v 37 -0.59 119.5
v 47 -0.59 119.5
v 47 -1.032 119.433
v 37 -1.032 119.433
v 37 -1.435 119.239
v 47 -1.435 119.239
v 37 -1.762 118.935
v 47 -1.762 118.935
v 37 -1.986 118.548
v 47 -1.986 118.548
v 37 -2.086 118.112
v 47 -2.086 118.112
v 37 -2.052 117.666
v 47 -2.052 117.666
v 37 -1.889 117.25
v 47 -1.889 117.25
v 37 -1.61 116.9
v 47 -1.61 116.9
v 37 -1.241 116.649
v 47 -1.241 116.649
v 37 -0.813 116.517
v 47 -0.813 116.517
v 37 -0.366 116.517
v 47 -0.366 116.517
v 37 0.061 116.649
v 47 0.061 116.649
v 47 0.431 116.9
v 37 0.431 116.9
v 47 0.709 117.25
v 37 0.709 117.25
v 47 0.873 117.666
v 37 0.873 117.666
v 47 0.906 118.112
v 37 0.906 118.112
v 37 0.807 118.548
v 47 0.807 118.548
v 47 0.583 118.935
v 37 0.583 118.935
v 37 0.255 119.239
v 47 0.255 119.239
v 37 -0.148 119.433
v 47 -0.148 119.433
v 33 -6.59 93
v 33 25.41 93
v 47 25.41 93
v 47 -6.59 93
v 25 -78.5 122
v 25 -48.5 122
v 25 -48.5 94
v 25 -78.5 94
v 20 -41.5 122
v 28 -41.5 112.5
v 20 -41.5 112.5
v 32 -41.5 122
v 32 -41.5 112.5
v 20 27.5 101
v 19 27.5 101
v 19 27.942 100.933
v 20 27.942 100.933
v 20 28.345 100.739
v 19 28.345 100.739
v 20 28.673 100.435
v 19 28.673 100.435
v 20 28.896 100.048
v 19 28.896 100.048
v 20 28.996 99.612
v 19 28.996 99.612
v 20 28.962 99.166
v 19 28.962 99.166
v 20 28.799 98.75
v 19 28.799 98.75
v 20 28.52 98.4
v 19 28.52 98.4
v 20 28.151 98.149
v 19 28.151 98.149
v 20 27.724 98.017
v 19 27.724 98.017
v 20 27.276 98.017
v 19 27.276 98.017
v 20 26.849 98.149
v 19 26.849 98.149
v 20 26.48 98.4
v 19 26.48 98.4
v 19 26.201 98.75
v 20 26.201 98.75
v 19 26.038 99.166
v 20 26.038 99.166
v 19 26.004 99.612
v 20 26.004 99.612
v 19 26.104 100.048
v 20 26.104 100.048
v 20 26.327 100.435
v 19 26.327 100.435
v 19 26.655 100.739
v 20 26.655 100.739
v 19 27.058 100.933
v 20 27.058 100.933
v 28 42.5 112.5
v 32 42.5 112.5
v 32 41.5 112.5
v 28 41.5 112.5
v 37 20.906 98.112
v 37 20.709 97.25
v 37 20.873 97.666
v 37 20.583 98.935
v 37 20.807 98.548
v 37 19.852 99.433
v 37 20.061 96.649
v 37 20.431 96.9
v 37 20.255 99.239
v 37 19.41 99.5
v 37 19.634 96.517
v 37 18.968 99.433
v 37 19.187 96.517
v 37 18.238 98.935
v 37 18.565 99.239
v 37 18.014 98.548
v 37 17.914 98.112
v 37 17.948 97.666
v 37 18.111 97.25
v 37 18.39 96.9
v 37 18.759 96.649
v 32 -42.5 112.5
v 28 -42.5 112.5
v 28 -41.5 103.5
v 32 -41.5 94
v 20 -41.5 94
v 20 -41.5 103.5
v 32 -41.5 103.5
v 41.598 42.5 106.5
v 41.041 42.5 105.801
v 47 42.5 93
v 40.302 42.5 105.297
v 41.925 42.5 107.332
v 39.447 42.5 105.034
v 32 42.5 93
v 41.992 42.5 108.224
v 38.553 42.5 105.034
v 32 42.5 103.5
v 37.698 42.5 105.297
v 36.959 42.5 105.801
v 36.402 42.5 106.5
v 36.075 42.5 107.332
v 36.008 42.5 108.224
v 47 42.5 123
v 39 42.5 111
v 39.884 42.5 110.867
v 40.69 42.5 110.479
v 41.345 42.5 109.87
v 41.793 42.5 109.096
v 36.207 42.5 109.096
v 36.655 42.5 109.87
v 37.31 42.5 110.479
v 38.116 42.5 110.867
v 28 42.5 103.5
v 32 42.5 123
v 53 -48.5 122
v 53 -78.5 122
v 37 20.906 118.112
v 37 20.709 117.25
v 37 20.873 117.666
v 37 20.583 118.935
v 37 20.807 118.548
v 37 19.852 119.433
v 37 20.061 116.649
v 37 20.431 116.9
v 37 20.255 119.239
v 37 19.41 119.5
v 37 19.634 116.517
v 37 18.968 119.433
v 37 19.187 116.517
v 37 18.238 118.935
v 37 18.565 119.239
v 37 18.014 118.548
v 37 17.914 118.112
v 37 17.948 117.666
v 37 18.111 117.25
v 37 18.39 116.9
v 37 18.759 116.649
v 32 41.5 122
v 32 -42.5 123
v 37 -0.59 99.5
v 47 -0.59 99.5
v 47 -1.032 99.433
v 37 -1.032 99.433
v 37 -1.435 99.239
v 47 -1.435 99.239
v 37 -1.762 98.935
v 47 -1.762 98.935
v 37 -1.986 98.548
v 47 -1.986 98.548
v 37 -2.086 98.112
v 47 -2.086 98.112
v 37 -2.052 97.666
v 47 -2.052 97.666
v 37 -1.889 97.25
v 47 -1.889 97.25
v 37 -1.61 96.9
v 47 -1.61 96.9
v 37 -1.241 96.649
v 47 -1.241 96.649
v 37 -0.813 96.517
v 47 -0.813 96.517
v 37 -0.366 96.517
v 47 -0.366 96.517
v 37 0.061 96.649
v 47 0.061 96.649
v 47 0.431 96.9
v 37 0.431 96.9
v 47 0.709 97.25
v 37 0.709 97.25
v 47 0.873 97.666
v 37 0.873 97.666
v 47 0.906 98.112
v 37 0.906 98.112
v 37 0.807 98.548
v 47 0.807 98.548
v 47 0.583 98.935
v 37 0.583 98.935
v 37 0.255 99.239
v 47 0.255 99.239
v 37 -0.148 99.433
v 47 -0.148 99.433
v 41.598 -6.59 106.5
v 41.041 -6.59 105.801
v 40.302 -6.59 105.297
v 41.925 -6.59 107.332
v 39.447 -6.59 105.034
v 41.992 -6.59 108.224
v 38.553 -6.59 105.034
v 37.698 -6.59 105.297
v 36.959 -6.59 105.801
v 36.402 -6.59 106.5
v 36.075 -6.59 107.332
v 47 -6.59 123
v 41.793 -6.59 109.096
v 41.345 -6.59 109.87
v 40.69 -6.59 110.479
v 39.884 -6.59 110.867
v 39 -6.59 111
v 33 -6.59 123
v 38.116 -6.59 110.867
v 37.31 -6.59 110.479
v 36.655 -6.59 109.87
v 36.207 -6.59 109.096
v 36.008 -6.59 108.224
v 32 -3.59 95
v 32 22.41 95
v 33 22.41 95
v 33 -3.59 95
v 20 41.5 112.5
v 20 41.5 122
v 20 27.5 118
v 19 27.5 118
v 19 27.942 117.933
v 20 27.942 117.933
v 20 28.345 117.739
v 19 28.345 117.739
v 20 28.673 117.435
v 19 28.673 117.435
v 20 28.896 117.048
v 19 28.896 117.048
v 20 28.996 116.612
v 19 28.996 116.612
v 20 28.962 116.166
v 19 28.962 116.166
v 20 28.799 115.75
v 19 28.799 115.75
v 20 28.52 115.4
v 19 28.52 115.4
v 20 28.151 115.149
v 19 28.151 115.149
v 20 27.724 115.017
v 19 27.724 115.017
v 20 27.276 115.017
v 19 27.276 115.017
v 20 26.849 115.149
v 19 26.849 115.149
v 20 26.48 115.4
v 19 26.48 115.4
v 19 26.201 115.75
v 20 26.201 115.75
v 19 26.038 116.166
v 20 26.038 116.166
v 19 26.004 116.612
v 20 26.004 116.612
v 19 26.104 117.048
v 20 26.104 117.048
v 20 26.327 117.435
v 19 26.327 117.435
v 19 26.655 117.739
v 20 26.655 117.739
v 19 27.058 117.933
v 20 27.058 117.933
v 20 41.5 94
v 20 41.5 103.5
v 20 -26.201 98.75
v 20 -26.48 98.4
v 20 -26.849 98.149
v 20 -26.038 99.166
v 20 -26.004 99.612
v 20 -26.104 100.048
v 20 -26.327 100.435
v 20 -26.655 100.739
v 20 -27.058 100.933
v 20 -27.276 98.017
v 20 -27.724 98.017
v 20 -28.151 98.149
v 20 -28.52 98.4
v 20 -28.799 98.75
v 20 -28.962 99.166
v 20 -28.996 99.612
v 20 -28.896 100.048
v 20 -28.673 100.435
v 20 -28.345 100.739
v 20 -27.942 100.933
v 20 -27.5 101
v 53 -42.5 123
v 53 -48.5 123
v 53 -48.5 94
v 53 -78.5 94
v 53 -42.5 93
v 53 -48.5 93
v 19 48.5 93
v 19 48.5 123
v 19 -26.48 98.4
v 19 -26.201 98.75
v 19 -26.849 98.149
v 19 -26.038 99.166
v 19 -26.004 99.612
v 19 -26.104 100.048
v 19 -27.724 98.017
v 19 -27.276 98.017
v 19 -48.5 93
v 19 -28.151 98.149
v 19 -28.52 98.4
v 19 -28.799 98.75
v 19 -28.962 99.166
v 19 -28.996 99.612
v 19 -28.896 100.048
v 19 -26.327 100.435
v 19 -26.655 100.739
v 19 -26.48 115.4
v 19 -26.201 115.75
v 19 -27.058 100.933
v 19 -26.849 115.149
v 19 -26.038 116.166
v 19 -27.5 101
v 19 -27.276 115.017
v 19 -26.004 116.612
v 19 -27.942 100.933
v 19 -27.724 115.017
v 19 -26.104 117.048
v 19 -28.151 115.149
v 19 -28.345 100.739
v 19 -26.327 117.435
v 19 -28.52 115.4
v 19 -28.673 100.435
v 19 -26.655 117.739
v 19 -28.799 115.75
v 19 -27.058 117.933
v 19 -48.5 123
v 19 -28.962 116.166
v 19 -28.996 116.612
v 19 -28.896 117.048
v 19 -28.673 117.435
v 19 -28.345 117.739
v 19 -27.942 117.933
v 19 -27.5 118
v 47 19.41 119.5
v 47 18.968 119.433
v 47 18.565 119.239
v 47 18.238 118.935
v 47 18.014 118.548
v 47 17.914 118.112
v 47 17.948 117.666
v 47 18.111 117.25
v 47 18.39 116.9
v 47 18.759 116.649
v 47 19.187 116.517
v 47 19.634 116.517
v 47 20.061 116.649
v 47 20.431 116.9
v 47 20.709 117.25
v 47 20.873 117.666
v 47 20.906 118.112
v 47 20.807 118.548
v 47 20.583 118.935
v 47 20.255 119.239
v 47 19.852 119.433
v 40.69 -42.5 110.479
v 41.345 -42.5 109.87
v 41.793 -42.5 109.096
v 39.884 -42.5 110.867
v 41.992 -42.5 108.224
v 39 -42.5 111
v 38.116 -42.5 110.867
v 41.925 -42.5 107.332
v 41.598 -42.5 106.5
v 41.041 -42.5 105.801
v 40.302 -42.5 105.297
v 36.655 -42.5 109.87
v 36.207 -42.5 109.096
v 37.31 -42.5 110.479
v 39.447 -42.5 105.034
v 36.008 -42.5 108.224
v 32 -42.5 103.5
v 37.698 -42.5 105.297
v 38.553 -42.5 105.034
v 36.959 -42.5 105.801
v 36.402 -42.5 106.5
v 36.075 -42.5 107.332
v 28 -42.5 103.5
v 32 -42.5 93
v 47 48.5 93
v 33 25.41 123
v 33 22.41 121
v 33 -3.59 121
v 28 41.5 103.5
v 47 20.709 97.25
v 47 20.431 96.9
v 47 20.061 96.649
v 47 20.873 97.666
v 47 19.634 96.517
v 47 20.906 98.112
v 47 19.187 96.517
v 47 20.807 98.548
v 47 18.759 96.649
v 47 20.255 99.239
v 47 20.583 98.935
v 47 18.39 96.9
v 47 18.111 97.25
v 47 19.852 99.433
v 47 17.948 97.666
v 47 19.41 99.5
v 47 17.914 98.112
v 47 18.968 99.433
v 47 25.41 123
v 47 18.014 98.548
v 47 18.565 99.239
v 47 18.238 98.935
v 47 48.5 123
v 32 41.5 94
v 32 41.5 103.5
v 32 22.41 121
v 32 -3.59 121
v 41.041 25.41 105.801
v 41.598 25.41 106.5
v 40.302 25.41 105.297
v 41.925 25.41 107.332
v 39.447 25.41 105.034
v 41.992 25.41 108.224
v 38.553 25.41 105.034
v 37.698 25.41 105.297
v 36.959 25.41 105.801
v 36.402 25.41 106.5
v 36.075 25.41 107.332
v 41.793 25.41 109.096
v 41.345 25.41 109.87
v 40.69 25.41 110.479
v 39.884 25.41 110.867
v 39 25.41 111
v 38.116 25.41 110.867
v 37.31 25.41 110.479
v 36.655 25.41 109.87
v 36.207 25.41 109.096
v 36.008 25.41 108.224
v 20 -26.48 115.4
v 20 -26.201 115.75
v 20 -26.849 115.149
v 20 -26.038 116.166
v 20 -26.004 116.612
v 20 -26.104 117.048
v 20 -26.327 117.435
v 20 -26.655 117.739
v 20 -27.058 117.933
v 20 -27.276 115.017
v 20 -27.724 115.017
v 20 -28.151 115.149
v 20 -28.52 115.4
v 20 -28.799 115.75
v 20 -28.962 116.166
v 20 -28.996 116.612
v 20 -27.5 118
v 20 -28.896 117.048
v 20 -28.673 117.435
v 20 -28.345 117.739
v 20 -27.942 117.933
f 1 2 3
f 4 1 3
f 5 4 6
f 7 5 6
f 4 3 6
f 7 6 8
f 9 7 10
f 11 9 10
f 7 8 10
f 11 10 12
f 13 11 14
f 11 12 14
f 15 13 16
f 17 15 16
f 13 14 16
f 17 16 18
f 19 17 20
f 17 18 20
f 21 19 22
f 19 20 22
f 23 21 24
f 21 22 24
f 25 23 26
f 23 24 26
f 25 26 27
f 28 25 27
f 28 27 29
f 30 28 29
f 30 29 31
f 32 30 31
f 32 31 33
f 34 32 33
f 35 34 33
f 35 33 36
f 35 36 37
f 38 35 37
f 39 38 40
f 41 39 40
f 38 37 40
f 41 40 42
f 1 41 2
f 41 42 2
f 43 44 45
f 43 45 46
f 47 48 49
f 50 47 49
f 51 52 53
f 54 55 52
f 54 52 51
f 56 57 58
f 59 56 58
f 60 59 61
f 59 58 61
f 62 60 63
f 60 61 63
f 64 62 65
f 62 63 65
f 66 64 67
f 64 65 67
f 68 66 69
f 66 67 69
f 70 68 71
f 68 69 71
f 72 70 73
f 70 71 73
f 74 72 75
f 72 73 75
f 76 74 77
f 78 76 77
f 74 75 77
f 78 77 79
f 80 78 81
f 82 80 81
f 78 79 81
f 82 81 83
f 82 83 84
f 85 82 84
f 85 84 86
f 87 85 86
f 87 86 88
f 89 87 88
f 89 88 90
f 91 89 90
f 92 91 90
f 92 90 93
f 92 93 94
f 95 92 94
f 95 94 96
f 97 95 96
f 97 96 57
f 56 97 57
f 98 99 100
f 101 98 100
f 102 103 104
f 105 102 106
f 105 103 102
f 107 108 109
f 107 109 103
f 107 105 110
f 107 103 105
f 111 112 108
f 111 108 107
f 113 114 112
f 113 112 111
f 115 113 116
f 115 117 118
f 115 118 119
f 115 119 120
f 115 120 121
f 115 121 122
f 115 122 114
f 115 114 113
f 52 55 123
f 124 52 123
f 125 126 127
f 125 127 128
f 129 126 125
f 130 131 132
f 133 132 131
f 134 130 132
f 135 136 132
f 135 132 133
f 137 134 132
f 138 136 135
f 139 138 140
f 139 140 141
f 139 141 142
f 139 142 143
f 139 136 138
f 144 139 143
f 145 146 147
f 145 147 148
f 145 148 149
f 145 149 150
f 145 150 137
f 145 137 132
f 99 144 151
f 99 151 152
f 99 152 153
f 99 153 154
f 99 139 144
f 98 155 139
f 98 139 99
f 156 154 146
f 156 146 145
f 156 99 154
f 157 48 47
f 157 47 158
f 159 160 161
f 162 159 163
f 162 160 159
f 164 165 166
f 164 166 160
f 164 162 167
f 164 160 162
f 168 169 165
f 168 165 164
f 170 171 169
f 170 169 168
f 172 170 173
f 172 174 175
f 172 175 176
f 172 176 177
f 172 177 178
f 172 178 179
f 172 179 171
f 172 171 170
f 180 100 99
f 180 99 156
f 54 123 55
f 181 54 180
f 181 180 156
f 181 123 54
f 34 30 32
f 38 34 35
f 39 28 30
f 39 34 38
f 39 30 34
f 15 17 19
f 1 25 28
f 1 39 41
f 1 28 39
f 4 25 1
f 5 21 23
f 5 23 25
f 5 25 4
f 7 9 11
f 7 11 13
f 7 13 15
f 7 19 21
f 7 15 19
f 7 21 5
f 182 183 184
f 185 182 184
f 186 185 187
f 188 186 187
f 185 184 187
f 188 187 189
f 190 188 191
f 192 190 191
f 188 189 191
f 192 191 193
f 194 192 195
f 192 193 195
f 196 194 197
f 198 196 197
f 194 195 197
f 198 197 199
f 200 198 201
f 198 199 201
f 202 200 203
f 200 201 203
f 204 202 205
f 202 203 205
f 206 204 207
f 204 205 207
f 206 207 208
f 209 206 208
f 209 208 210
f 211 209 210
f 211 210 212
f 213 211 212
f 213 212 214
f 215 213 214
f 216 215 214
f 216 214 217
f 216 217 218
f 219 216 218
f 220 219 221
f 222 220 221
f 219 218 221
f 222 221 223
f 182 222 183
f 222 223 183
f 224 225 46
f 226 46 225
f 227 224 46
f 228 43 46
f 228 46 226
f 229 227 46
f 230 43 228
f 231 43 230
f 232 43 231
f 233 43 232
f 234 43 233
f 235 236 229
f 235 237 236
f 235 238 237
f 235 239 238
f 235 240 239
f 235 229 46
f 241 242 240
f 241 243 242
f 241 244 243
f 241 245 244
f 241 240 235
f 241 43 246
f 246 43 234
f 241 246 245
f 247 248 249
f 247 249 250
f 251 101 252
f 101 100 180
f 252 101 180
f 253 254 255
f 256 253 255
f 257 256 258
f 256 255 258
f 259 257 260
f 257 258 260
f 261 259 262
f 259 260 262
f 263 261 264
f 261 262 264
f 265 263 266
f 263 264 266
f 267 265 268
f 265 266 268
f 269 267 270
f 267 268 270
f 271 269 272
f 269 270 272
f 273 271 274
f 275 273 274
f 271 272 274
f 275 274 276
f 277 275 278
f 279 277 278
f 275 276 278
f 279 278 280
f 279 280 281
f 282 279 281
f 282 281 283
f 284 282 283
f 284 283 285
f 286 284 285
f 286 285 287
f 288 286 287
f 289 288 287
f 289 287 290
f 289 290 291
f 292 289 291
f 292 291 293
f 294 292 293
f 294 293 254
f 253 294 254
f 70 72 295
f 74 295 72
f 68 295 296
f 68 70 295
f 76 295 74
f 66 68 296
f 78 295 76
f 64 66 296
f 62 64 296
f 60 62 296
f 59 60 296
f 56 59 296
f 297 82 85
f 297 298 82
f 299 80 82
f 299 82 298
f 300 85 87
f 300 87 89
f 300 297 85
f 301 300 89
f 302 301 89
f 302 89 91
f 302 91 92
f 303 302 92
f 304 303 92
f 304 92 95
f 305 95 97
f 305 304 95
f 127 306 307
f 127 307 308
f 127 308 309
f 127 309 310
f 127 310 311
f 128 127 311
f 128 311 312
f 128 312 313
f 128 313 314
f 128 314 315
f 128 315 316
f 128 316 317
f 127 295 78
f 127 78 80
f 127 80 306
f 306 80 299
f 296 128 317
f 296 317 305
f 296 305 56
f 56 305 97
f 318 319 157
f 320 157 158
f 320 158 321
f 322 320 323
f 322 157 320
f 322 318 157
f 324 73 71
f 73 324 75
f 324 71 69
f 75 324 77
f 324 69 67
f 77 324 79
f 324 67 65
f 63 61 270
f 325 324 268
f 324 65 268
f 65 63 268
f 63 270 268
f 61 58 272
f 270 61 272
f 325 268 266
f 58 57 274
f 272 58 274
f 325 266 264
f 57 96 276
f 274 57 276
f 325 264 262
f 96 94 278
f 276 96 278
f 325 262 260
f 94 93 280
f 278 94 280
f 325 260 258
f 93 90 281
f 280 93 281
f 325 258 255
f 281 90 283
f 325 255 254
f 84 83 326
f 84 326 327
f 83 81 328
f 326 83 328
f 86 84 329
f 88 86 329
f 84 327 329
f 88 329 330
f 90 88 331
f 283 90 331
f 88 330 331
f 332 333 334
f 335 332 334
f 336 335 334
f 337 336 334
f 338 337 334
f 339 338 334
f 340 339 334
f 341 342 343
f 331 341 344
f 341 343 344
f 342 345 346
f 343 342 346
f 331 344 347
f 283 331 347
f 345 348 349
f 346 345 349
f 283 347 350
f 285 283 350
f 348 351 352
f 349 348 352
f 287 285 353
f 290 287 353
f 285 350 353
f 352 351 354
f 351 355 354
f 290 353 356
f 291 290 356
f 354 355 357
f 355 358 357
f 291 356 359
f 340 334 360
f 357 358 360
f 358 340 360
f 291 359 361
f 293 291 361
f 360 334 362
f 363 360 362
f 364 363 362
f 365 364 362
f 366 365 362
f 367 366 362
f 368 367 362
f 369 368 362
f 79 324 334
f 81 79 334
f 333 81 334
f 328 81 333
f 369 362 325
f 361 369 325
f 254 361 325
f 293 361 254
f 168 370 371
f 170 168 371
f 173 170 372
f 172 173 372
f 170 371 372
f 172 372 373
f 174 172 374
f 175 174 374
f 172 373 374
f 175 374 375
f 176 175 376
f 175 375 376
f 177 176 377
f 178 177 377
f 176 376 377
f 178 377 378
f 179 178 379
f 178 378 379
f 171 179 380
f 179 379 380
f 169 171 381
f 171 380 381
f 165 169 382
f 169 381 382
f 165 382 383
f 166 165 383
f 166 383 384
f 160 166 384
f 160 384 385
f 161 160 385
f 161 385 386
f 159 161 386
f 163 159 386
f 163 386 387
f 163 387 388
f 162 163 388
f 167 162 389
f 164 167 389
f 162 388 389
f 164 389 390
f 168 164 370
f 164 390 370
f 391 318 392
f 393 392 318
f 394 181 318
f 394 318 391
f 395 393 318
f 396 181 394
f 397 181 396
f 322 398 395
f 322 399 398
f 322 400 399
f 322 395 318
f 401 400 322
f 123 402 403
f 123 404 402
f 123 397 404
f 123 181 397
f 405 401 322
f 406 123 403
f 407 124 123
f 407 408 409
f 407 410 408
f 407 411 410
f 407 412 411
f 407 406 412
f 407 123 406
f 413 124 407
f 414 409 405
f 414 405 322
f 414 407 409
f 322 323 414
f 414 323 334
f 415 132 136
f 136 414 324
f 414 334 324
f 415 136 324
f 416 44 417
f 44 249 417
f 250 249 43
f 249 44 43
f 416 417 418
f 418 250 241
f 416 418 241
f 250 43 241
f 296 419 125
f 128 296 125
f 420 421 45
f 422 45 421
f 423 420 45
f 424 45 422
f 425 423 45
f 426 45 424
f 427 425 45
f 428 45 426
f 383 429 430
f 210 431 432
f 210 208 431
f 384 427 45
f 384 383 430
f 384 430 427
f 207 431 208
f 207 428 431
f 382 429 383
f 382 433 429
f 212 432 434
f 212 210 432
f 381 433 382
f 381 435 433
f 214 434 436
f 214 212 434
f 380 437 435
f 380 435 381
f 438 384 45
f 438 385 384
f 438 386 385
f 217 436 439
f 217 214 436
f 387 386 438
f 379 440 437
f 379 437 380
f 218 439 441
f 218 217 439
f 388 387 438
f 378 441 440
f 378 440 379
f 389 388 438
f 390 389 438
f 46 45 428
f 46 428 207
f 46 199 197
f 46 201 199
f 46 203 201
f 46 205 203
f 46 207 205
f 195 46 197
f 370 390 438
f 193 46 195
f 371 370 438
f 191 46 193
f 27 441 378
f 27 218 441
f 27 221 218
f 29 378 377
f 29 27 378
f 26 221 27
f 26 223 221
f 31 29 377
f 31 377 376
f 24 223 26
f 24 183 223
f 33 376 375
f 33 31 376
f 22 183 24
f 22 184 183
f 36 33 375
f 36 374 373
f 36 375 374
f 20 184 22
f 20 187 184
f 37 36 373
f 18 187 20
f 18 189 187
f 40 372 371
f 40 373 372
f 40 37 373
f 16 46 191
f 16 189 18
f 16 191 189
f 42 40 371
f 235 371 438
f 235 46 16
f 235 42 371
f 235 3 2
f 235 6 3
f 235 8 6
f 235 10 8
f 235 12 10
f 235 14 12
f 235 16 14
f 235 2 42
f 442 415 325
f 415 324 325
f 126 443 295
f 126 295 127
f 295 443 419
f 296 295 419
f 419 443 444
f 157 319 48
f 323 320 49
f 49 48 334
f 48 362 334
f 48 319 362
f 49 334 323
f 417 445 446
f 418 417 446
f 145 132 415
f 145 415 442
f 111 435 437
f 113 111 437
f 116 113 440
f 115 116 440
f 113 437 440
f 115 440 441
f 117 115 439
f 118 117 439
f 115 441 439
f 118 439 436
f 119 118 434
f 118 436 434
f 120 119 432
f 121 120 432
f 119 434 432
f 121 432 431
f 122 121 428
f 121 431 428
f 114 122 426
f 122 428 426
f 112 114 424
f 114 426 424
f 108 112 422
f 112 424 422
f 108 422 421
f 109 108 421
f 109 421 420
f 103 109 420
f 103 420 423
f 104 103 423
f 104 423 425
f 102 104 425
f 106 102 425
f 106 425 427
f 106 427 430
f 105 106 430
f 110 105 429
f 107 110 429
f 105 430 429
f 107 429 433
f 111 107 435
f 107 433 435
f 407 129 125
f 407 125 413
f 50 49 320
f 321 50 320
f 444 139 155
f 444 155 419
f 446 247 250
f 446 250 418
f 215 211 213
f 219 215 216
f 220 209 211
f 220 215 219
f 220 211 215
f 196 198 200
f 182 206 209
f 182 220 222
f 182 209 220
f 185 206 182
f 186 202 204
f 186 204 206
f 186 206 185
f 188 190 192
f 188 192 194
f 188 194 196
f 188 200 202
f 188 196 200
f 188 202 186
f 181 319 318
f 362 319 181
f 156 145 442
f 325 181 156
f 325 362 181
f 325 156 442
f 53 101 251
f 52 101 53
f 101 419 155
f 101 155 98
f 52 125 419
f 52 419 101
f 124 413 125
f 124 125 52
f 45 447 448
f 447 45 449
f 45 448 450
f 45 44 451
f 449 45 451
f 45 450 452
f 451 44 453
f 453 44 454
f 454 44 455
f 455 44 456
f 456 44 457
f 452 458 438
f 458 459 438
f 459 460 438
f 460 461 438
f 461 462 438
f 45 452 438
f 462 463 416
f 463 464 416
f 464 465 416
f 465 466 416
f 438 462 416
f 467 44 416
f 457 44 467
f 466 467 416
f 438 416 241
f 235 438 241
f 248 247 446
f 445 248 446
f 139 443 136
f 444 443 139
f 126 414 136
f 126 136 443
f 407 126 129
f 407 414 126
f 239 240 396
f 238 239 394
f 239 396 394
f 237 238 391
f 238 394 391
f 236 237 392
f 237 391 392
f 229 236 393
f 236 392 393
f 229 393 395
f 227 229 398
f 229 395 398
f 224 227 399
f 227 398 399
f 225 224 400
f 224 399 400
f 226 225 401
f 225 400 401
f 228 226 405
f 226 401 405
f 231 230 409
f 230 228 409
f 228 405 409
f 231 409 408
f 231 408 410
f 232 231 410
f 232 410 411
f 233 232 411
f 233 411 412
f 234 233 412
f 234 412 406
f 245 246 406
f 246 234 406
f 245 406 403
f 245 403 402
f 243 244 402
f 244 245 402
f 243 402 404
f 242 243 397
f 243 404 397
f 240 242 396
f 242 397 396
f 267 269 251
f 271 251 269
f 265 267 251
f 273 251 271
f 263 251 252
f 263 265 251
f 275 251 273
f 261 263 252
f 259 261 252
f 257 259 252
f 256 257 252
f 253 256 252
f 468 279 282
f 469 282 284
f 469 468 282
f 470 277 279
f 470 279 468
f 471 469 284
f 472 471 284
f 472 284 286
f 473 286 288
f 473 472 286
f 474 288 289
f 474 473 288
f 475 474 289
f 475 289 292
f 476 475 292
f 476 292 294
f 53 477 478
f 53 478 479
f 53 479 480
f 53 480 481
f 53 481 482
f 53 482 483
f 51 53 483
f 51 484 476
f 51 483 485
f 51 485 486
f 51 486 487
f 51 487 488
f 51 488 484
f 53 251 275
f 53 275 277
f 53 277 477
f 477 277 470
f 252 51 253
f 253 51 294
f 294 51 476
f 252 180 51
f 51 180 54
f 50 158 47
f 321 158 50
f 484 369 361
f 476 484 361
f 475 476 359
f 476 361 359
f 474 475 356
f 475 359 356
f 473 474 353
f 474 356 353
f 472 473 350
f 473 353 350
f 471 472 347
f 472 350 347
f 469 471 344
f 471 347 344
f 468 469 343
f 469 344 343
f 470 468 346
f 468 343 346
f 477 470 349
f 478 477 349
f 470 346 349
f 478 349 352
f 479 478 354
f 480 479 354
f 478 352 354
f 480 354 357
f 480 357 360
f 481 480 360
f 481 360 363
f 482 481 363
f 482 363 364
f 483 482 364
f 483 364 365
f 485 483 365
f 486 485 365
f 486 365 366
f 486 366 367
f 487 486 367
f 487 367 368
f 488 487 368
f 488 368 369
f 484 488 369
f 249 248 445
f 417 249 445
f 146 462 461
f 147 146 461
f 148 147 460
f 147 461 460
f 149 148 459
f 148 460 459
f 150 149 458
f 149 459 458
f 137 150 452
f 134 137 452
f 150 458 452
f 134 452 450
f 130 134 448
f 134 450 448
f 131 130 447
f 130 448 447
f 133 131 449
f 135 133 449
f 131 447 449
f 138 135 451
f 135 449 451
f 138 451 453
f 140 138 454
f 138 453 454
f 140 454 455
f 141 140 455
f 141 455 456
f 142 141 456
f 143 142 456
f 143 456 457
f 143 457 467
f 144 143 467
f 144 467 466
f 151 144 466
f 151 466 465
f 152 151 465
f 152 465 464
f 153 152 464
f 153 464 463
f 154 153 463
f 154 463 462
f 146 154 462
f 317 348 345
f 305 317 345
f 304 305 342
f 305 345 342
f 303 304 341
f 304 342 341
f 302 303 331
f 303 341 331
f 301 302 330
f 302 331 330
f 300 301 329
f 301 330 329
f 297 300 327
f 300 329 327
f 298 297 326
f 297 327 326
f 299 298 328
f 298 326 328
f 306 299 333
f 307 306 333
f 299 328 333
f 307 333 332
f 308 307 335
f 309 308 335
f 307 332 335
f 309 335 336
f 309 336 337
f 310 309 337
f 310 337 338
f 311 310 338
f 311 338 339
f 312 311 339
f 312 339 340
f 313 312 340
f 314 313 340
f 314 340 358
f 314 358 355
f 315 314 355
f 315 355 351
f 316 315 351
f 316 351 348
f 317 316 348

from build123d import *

# Parameters (mm, degrees)
SKETCH003_W             = 30
SKETCH003_H             = 97
PAD002_DEPTH            = 13
SKETCH004_W             = 30
SKETCH004_H             = 6
PAD003_DEPTH            = 15
PAD003_FACE5_W          = 30
PAD003_FACE5_H          = 6
PAD004_DEPTH            = 6
SKETCH005_W             = 28
SKETCH005_H             = 28
PAD005_DEPTH            = 30
SKETCH006_W             = 26
SKETCH006_H             = 26
PAD006_DEPTH            = 1
SKETCH007_W             = 30
SKETCH007_H             = 32
PAD007_DEPTH            = 14
SKETCH008_R             = 1.5
POCKET_DEPTH            = 10
SKETCH009_R             = 3
PAD008_DEPTH            = 85
SKETCH010_W             = 9
SKETCH010_H             = 85
POCKET001_DEPTH         = 4
SKETCH011_R             = 1.5
POCKET002_DEPTH         = 14
SKETCH028_W             = 9.5
SKETCH028_H             = 83
POCKET007_DEPTH         = 12
SKETCH029_W             = 9.5
SKETCH029_H             = 83
POCKET008_DEPTH         = 12
BODY001_PITCH_ANGLE     = -90
BODY001_PLACEMENT_ANGLE = 90


with BuildPart() as part:
    # Sketch003 → Pad002 (new body)
    with BuildSketch(Plane.XZ):
        Rectangle(SKETCH003_W, SKETCH003_H)
    extrude(amount=PAD002_DEPTH)

    # Sketch004 (on Face6 of Pad002) → Pad003 (join)
    with BuildSketch(Plane.XZ.offset(13)):
        with Locations((0, -45.5)):
            Rectangle(SKETCH004_W, SKETCH004_H)
        with Locations((0, 45.5)):
            Rectangle(SKETCH004_W, SKETCH004_H)
    extrude(amount=PAD003_DEPTH)

    # Pad003 Face5 → Pad004 (add)
    with BuildSketch(Plane(origin=(0, -28, 45.5), x_dir=(-1, 0, 0), z_dir=(0, -1, 0))):
        Rectangle(PAD003_FACE5_W, PAD003_FACE5_H)
    extrude(amount=PAD004_DEPTH)

    # Sketch005 (on Face8 of Pad004) → Pad005 (join)
    with BuildSketch(Plane(origin=(0, 0, 48.5), x_dir=(-1, 0, 0), z_dir=(0, 0, 1))):
        with Locations((0, 20)):
            Rectangle(SKETCH005_W, SKETCH005_H)
    extrude(amount=PAD005_DEPTH)

    # Sketch006 (on Face1 of Pad005) → Pad006 (join)
    with BuildSketch(Plane(origin=(0, -13, 10), x_dir=(1, 0, 0), z_dir=(0, -1, 0))):
        with Locations((0, -19.410291)):
            Rectangle(SKETCH006_W, SKETCH006_H)
    extrude(amount=PAD006_DEPTH)

    # Sketch007 (on Face15 of Pad006) → Pad007 (join)
    with BuildSketch(Plane.XZ.offset(14)):
        with Locations((0, -9.410291)):
            Rectangle(SKETCH007_W, SKETCH007_H)
    extrude(amount=PAD007_DEPTH)

    # Sketch008 (on Face24 of Pad007) → Pocket (cut)
    with BuildSketch(Plane.XZ.offset(28)):
        with Locations((-10, 0.589709)):
            Circle(SKETCH008_R)
        with Locations((10, 0.589709)):
            Circle(SKETCH008_R)
        with Locations((10, -19.410291)):
            Circle(SKETCH008_R)
        with Locations((-10, -19.410291)):
            Circle(SKETCH008_R)
    extrude(amount=-POCKET_DEPTH, mode=Mode.SUBTRACT)

    # Sketch009 (on Face5 of Pocket) → Pad008 (join)
    with BuildSketch(Plane(origin=(0, 0, 42.5), x_dir=(1, 0, 0), z_dir=(0, 0, -1))):
        with Locations((0, 20)):
            Circle(SKETCH009_R)
    extrude(amount=PAD008_DEPTH)

    # Sketch010 (on Face1 of Pad008) → Pocket001 (cut)
    with BuildSketch(Plane.XZ.offset(13)):
        Rectangle(SKETCH010_W, SKETCH010_H)
    extrude(amount=-POCKET001_DEPTH, mode=Mode.SUBTRACT)

    # Sketch011 (on Face8 of Pocket001) → Pocket002 (cut)
    with BuildSketch(Plane(origin=(0, 0, 0), x_dir=(1, 0, 0), z_dir=(0, 1, 0))):
        with Locations((-8.5, 27.5)):
            Circle(SKETCH011_R)
        with Locations((8.5, 27.5)):
            Circle(SKETCH011_R)
        with Locations((8.5, -27.5)):
            Circle(SKETCH011_R)
        with Locations((-8.5, -27.5)):
            Circle(SKETCH011_R)
    extrude(amount=-POCKET002_DEPTH, mode=Mode.SUBTRACT)

    # Sketch028 (on Face18 of Pocket002) → Pocket007 (cut)
    with BuildSketch(Plane.XZ.offset(13)):
        with Locations((-9.25, 0)):
            Rectangle(SKETCH028_W, SKETCH028_H)
    extrude(amount=-POCKET007_DEPTH, mode=Mode.SUBTRACT)

    # Sketch029 (on Face1 of Pocket007) → Pocket008 (cut)
    with BuildSketch(Plane.XZ.offset(13)):
        with Locations((9.25, 0)):
            Rectangle(SKETCH029_W, SKETCH029_H)
    extrude(amount=-POCKET008_DEPTH, mode=Mode.SUBTRACT)


with BuildPart() as part_1:
    # Body001 pitch: moved
    add(part.part.rotate(Axis((0, 0, 0), (0, 1, 0)), BODY001_PITCH_ANGLE))


with BuildPart() as part_2:
    # Body001 placement: moved
    add(part_1.part.moved(Location((19, 0, 108))).rotate(Axis((19, 0, 108), (0, 0, 1)), BODY001_PLACEMENT_ANGLE))


solid = part_2.part
